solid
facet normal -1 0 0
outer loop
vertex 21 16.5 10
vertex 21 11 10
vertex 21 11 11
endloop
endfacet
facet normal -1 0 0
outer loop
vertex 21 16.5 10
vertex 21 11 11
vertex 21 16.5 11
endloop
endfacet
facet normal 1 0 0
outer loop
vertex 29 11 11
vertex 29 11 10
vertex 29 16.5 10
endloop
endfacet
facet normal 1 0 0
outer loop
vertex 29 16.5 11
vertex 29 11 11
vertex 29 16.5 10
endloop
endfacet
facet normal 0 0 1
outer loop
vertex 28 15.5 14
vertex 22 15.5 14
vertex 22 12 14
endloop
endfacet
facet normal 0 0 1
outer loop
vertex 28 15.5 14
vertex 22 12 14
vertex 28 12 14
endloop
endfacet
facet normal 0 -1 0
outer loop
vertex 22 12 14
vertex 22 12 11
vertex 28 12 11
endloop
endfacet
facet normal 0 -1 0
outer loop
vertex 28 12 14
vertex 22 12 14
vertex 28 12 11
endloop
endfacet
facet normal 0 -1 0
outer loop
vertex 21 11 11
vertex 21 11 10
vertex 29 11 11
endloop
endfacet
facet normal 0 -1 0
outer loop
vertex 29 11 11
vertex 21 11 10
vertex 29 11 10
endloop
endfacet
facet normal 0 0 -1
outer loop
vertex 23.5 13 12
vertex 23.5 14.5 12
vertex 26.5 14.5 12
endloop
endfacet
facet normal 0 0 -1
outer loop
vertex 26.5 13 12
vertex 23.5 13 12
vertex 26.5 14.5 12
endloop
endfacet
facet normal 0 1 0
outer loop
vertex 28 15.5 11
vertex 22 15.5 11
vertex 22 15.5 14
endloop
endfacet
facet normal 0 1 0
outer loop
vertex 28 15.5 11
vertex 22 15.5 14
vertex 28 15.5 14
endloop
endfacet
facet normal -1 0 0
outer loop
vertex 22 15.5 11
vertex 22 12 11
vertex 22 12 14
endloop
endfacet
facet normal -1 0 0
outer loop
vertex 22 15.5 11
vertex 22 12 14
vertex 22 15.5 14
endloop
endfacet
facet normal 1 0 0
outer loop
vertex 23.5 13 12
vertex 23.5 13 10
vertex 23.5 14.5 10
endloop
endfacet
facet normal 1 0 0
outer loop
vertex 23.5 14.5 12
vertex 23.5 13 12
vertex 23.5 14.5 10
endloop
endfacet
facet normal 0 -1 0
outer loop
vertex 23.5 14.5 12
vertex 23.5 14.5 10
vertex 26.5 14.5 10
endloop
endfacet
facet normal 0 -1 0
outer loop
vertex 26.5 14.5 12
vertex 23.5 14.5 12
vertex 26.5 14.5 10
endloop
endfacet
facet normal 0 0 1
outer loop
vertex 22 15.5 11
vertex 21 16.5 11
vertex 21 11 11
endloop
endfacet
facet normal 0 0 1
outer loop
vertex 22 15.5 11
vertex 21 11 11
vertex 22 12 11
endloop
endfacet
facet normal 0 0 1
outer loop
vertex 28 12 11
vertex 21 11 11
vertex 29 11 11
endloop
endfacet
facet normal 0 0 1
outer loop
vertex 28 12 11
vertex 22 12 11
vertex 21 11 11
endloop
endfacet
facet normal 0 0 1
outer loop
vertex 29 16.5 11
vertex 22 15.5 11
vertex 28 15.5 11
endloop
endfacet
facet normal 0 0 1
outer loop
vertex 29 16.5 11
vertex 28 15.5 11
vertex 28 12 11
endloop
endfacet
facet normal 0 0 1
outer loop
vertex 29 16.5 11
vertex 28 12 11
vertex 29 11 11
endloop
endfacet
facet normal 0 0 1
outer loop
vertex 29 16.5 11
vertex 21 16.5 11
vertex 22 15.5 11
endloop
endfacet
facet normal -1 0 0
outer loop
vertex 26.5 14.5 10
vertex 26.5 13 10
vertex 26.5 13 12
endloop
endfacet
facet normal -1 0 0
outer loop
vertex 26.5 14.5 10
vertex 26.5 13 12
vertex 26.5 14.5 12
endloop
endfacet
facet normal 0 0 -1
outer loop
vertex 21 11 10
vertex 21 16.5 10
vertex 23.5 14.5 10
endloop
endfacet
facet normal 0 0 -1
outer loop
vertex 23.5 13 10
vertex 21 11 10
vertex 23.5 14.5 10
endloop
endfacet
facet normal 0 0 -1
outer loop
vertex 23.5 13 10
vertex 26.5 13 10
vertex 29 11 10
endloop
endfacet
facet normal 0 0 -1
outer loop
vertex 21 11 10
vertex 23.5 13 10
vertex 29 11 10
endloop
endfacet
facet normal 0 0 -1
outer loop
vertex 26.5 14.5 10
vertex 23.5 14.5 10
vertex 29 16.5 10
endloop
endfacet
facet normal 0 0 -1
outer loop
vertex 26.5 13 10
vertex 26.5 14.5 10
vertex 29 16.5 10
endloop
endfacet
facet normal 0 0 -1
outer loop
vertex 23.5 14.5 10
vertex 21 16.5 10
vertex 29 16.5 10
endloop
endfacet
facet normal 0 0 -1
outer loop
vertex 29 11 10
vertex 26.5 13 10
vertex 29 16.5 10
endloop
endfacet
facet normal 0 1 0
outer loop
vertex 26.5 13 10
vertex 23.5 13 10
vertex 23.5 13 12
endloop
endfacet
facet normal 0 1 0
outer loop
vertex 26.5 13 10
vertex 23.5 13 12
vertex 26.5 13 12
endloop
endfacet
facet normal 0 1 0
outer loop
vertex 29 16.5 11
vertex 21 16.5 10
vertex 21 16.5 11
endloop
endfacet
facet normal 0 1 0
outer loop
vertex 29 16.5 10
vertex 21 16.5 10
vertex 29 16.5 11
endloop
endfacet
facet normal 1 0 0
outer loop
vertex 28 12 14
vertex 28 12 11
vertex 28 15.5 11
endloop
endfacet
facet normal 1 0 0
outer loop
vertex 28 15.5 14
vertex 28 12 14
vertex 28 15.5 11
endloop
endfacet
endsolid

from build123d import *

# Parameters (mm, degrees)
BOX017_W     = 3
BOX017_H     = 1.5
BOX017_DEPTH = 2
BOX016_W     = 8
BOX016_H     = 5.5
BOX016_DEPTH = 1
BOX015_W     = 6
BOX015_H     = 3.5
BOX015_DEPTH = 3


with BuildPart() as cube015:
    # Box017 → Box017 (new body)
    with BuildSketch(Plane(origin=(23.5, 13, 10), x_dir=(1, 0, 0), z_dir=(0, 0, 1))):
        with Locations((1.5, 0.75)):
            Rectangle(BOX017_W, BOX017_H)
    extrude(amount=BOX017_DEPTH)


with BuildPart() as cube014:
    # Box016 → Box016 (new body)
    with BuildSketch(Plane(origin=(21, 11, 10), x_dir=(1, 0, 0), z_dir=(0, 0, 1))):
        with Locations((4, 2.75)):
            Rectangle(BOX016_W, BOX016_H)
    extrude(amount=BOX016_DEPTH)


with BuildPart() as membrane_sw002:
    # Box015 → Box015 (new body)
    with BuildSketch(Plane(origin=(22, 12, 11), x_dir=(1, 0, 0), z_dir=(0, 0, 1))):
        with Locations((3, 1.75)):
            Rectangle(BOX015_W, BOX015_H)
    extrude(amount=BOX015_DEPTH)

    # Fusion004: union Cube014
    add(cube014.part)

    # Cut004: cut Cube015
    add(cube015.part, mode=Mode.SUBTRACT)


solid = membrane_sw002.part
